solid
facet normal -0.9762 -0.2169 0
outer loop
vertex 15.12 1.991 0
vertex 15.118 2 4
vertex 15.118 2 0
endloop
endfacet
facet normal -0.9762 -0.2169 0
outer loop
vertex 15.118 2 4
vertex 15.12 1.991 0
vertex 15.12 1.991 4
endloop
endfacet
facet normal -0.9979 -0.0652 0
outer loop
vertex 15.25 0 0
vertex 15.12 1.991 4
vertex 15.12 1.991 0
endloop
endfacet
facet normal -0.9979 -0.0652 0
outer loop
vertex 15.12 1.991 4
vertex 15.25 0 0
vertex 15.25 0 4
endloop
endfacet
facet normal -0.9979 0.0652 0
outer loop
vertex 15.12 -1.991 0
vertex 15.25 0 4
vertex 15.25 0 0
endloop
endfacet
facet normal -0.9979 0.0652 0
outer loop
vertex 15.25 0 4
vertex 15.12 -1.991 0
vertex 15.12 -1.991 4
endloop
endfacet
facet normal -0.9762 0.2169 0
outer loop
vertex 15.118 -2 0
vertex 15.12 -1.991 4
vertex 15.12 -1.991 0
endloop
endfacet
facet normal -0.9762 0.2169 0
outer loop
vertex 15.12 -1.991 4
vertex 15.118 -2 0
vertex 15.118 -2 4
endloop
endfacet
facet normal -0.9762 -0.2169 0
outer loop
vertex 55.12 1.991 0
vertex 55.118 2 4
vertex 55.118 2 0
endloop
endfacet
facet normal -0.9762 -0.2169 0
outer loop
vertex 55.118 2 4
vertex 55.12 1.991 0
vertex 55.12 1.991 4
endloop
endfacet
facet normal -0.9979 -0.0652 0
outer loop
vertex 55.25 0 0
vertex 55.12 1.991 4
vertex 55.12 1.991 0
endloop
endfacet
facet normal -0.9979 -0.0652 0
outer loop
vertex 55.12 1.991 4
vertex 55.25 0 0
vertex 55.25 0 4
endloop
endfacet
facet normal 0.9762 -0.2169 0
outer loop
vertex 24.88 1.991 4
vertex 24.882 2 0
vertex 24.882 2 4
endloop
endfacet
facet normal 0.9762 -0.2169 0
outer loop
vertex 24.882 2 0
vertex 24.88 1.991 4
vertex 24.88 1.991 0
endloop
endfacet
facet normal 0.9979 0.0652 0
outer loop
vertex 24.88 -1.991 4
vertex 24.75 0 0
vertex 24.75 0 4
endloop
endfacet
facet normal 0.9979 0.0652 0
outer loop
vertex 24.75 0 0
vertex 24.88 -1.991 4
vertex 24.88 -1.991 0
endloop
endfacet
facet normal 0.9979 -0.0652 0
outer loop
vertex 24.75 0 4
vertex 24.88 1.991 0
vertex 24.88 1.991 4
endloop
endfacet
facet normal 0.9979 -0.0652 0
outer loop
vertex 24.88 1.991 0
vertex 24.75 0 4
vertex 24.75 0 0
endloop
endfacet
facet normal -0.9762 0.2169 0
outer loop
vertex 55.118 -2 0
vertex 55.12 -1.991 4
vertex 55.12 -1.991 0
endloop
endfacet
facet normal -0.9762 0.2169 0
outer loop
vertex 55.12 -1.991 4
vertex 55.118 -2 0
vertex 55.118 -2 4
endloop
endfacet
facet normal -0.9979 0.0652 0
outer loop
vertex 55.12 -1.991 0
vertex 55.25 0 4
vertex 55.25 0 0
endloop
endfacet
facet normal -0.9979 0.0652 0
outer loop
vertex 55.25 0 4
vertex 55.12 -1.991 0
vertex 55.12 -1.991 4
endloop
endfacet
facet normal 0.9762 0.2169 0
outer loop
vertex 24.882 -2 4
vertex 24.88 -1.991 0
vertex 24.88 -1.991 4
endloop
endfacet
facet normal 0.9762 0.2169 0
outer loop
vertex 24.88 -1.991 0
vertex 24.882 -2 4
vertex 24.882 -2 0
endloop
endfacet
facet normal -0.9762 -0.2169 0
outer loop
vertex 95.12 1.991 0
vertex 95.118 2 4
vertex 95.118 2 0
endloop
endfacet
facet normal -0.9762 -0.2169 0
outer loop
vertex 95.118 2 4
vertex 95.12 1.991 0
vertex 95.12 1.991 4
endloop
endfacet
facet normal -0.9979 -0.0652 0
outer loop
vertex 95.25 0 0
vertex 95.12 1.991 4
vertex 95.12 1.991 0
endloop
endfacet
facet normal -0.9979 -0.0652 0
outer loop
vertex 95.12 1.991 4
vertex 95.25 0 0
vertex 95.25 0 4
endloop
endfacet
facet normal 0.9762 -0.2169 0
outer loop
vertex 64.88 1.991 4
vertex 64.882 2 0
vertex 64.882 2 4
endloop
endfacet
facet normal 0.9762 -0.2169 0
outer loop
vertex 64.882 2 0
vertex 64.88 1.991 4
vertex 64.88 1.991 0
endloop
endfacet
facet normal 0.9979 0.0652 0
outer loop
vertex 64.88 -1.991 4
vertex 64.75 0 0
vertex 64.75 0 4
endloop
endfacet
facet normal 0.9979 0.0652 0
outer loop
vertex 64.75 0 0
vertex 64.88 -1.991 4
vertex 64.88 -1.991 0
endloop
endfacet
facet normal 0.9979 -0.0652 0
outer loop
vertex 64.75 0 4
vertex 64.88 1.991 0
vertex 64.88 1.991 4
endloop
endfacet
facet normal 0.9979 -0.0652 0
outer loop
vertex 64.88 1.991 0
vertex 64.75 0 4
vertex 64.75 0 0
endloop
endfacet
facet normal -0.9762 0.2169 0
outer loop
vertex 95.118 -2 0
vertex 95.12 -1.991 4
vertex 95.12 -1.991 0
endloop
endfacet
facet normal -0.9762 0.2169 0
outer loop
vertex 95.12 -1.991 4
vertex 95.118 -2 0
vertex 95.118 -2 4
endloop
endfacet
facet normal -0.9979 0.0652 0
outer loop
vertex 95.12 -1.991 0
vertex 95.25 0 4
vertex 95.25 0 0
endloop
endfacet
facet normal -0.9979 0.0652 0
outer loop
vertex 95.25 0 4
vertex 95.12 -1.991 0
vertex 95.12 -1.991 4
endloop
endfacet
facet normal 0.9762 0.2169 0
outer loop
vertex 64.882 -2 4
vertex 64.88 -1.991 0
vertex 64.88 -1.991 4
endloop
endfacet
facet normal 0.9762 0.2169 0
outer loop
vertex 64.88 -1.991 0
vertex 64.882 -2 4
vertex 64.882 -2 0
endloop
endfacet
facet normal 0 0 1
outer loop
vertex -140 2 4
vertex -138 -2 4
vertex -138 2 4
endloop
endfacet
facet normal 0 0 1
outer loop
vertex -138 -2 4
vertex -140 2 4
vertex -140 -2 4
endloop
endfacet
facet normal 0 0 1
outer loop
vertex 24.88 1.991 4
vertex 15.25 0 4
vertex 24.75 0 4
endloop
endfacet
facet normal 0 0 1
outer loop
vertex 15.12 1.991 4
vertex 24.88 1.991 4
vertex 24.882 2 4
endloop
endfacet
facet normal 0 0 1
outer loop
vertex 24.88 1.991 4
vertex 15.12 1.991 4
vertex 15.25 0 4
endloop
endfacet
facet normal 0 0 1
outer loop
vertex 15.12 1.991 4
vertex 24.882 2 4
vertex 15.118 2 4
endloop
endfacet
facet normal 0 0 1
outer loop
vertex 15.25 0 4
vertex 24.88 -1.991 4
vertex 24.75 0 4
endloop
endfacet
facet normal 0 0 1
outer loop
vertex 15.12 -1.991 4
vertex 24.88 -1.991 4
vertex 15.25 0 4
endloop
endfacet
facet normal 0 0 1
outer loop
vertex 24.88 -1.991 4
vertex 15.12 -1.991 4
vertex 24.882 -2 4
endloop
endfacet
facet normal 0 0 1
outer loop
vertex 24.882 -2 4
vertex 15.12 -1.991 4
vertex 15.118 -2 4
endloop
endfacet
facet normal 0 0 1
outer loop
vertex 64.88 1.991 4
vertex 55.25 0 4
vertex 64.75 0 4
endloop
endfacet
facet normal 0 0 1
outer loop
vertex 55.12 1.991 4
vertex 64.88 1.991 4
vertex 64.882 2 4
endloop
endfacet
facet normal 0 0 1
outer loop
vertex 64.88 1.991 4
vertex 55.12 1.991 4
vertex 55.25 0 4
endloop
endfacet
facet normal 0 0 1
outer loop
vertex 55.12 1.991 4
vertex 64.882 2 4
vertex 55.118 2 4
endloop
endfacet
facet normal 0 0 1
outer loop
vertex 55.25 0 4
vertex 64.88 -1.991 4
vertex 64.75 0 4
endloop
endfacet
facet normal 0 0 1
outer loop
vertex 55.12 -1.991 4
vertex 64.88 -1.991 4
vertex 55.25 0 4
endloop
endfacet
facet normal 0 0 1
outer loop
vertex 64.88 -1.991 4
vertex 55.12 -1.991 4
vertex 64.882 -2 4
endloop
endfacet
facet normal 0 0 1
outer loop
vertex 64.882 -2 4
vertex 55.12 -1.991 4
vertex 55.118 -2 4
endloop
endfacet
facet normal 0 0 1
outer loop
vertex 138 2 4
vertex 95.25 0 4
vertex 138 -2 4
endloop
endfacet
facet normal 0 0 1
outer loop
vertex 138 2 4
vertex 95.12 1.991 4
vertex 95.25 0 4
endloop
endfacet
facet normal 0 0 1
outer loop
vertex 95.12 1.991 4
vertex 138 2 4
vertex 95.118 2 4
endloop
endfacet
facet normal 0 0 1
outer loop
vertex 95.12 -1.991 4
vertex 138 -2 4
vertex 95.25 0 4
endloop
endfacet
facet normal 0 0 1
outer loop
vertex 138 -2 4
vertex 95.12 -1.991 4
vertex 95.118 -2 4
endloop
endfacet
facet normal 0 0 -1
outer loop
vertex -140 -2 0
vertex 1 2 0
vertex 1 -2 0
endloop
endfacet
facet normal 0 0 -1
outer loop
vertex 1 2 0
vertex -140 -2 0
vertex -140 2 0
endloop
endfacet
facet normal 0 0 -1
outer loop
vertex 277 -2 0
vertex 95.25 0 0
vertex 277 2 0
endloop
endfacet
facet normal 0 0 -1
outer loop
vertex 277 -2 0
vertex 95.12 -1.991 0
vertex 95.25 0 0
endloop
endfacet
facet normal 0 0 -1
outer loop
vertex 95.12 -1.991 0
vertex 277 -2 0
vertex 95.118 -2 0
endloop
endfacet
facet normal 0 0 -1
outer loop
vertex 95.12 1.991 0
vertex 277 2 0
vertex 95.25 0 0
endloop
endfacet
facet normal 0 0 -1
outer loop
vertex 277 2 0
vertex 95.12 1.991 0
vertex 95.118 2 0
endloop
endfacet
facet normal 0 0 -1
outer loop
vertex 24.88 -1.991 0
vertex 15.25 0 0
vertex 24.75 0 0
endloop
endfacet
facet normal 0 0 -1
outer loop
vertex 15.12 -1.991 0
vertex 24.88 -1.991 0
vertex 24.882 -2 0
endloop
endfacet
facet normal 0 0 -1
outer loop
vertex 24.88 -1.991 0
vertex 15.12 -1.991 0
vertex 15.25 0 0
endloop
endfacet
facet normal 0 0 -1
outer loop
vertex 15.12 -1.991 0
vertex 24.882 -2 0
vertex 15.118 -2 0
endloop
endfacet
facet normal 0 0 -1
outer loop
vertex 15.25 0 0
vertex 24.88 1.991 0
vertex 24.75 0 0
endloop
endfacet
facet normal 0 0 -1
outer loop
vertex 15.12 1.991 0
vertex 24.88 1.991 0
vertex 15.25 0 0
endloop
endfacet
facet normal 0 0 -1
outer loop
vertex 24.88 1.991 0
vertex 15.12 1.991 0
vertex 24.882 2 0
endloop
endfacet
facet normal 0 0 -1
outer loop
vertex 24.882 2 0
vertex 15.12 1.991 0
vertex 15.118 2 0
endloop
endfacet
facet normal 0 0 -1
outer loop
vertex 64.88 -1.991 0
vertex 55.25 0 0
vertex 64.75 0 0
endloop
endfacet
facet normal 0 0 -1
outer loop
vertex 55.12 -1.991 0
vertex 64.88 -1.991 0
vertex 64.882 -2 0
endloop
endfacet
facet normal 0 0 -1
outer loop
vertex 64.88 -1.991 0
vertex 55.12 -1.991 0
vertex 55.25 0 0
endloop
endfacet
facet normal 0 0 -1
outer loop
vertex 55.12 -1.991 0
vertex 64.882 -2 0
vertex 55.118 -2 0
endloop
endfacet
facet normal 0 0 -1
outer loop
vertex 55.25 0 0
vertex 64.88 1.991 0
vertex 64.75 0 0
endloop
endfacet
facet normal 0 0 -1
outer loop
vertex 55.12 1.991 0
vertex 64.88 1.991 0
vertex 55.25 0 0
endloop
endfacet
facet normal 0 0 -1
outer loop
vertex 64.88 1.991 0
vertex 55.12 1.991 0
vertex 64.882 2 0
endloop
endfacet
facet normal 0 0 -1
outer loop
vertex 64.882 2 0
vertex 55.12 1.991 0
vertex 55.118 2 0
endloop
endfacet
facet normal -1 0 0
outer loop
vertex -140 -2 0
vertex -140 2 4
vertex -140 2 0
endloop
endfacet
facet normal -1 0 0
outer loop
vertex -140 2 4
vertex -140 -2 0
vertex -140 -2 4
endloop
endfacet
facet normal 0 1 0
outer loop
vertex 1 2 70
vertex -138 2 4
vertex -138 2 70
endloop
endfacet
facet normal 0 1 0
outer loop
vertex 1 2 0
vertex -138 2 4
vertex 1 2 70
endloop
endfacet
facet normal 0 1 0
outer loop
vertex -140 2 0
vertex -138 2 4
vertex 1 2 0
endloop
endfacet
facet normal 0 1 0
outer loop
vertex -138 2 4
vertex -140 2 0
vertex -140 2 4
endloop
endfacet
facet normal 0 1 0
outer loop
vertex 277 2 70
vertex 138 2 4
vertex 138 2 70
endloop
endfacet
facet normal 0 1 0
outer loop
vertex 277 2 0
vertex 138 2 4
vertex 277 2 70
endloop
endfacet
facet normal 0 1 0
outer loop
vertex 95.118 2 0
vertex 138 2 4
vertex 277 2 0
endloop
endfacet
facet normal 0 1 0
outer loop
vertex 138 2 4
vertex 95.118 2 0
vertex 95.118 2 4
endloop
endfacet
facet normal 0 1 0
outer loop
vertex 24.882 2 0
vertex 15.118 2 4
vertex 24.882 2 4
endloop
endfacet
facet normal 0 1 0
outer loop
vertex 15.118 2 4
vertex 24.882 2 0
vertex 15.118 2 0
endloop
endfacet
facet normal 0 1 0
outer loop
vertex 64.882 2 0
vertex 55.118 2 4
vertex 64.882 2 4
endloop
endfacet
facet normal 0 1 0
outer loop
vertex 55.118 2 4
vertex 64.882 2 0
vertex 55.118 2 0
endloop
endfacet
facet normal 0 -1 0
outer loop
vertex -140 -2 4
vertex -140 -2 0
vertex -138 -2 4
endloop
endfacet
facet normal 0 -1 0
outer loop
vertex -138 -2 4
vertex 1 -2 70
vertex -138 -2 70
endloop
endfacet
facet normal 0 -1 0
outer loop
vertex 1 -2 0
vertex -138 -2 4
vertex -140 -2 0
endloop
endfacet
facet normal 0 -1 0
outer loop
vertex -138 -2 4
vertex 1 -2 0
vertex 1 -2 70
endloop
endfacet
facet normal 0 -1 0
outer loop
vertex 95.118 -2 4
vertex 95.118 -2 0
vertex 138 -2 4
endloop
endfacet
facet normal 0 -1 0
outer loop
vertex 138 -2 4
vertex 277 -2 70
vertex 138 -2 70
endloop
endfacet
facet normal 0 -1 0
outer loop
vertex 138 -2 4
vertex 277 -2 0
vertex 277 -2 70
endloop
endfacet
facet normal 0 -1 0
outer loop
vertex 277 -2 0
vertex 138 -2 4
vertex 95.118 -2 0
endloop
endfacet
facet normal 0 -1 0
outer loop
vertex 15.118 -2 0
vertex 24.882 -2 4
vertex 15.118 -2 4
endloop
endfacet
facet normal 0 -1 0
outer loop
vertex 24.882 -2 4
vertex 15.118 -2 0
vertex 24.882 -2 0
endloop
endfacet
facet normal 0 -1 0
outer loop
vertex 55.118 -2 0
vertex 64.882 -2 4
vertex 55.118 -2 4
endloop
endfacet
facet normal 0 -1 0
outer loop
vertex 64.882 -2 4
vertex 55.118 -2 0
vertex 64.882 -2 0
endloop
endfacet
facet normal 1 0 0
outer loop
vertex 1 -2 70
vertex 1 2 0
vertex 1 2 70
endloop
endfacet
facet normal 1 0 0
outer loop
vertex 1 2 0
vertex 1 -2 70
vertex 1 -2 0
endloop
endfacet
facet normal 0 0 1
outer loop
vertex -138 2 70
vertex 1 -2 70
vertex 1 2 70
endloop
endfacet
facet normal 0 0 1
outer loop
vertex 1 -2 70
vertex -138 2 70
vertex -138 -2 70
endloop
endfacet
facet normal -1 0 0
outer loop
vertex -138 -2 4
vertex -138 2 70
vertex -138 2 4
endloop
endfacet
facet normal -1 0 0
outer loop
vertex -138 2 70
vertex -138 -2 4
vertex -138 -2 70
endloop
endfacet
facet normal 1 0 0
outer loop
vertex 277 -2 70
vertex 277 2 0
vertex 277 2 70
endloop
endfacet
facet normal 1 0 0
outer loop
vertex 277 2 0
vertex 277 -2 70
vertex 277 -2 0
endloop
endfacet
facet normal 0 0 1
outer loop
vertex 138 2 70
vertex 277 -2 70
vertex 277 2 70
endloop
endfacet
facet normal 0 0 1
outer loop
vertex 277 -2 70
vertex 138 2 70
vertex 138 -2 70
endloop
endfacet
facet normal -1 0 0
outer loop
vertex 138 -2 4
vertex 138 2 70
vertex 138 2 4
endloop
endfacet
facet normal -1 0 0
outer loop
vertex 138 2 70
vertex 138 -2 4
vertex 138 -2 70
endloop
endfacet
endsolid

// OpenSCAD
// Tube rack - a flat plate with a regular grid of tube holes and two solid side walls.
// The two walls rest on a surface and the tubes pass through the holes. The short ends are
// open. NOVEL general part (a generic tube rack, not any one labware item).
//

cols   = 6;
pitch_x = 40;
pitch_y = 40;
layer  = 4;
h      = 70;
d      = 30.5;

$fn = 48;

plate_w = cols * pitch_x + 2 * (pitch_x / 2);   // centre-to-centre grid, one tube radius clear of the edge
plate_t = layer;

difference() {
    translate([-plate_w / 2, -plate_t / 2, 0]) cube([plate_w, plate_t, layer]);
    for (i = [-cols / 2 : 1 : cols / 2 - 1])
        for (j = [-1 : 1])
            translate([i * pitch_x, j * pitch_y, -1]) cylinder(h = layer + 2, d = d);
}

for (wall = [-1, 1])
    translate([wall * (plate_w / 2 - 2), -plate_t / 2, 0]) cube([plate_w / 2 - 1, plate_t, h]);
